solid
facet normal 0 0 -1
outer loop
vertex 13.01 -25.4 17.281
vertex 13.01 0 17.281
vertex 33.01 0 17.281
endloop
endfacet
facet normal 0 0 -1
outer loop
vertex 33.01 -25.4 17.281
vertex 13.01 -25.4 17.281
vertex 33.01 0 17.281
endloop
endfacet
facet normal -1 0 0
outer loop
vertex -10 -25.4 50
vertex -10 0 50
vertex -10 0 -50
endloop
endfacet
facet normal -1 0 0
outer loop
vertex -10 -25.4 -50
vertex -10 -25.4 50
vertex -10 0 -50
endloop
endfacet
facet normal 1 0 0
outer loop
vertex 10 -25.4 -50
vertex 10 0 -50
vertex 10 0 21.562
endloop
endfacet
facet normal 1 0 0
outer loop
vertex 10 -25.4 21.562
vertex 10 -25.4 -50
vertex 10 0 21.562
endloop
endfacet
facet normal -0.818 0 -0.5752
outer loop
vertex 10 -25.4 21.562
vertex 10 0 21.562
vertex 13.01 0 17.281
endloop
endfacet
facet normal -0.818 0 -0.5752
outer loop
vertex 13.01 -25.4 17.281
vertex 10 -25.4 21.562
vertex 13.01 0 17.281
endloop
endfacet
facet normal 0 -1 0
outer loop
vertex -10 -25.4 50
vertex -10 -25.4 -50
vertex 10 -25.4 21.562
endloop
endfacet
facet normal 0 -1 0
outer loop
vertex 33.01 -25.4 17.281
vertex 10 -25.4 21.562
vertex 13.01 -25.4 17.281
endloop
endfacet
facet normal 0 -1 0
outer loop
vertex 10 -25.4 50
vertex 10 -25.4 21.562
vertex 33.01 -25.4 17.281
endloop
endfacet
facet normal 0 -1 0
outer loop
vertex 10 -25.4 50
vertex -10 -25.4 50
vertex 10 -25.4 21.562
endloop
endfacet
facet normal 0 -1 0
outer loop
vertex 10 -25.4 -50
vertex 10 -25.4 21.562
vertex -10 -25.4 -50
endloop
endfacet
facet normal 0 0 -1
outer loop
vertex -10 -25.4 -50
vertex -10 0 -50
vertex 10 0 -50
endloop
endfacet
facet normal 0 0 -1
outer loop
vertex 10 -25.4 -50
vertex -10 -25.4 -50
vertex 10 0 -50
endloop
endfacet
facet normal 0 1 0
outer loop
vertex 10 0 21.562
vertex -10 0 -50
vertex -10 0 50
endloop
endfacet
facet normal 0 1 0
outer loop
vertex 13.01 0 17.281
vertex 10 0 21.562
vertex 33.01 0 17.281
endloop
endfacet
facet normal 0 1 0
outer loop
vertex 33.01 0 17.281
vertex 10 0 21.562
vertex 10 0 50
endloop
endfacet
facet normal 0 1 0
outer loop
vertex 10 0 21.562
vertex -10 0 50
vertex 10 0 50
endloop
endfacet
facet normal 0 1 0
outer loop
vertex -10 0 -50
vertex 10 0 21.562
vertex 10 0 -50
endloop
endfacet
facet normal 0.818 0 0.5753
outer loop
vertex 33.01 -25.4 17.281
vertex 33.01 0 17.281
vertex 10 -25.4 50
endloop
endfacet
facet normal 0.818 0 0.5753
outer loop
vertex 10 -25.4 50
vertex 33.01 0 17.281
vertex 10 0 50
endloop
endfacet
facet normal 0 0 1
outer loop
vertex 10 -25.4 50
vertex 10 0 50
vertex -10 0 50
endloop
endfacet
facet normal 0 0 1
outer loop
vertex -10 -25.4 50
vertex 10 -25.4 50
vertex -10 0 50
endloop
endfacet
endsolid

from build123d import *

# Parameters (mm, degrees)
F1_DEPTH = 25.4


with BuildPart() as f1:
    # F0 (on Front) → F1 (new body)
    with BuildSketch(Plane.XZ):
        Polygon((10, 21.561685), (-10, 50), (-10, -50), (10, -50), align=None)
        Polygon((10, 50), (-10, 50), (10, 21.561685), align=None)
        Polygon((33.010388, 17.281167), (10, 50), (10, 21.561685), (13.010388, 17.281167), align=None)
    extrude(amount=F1_DEPTH)


solid = f1.part
